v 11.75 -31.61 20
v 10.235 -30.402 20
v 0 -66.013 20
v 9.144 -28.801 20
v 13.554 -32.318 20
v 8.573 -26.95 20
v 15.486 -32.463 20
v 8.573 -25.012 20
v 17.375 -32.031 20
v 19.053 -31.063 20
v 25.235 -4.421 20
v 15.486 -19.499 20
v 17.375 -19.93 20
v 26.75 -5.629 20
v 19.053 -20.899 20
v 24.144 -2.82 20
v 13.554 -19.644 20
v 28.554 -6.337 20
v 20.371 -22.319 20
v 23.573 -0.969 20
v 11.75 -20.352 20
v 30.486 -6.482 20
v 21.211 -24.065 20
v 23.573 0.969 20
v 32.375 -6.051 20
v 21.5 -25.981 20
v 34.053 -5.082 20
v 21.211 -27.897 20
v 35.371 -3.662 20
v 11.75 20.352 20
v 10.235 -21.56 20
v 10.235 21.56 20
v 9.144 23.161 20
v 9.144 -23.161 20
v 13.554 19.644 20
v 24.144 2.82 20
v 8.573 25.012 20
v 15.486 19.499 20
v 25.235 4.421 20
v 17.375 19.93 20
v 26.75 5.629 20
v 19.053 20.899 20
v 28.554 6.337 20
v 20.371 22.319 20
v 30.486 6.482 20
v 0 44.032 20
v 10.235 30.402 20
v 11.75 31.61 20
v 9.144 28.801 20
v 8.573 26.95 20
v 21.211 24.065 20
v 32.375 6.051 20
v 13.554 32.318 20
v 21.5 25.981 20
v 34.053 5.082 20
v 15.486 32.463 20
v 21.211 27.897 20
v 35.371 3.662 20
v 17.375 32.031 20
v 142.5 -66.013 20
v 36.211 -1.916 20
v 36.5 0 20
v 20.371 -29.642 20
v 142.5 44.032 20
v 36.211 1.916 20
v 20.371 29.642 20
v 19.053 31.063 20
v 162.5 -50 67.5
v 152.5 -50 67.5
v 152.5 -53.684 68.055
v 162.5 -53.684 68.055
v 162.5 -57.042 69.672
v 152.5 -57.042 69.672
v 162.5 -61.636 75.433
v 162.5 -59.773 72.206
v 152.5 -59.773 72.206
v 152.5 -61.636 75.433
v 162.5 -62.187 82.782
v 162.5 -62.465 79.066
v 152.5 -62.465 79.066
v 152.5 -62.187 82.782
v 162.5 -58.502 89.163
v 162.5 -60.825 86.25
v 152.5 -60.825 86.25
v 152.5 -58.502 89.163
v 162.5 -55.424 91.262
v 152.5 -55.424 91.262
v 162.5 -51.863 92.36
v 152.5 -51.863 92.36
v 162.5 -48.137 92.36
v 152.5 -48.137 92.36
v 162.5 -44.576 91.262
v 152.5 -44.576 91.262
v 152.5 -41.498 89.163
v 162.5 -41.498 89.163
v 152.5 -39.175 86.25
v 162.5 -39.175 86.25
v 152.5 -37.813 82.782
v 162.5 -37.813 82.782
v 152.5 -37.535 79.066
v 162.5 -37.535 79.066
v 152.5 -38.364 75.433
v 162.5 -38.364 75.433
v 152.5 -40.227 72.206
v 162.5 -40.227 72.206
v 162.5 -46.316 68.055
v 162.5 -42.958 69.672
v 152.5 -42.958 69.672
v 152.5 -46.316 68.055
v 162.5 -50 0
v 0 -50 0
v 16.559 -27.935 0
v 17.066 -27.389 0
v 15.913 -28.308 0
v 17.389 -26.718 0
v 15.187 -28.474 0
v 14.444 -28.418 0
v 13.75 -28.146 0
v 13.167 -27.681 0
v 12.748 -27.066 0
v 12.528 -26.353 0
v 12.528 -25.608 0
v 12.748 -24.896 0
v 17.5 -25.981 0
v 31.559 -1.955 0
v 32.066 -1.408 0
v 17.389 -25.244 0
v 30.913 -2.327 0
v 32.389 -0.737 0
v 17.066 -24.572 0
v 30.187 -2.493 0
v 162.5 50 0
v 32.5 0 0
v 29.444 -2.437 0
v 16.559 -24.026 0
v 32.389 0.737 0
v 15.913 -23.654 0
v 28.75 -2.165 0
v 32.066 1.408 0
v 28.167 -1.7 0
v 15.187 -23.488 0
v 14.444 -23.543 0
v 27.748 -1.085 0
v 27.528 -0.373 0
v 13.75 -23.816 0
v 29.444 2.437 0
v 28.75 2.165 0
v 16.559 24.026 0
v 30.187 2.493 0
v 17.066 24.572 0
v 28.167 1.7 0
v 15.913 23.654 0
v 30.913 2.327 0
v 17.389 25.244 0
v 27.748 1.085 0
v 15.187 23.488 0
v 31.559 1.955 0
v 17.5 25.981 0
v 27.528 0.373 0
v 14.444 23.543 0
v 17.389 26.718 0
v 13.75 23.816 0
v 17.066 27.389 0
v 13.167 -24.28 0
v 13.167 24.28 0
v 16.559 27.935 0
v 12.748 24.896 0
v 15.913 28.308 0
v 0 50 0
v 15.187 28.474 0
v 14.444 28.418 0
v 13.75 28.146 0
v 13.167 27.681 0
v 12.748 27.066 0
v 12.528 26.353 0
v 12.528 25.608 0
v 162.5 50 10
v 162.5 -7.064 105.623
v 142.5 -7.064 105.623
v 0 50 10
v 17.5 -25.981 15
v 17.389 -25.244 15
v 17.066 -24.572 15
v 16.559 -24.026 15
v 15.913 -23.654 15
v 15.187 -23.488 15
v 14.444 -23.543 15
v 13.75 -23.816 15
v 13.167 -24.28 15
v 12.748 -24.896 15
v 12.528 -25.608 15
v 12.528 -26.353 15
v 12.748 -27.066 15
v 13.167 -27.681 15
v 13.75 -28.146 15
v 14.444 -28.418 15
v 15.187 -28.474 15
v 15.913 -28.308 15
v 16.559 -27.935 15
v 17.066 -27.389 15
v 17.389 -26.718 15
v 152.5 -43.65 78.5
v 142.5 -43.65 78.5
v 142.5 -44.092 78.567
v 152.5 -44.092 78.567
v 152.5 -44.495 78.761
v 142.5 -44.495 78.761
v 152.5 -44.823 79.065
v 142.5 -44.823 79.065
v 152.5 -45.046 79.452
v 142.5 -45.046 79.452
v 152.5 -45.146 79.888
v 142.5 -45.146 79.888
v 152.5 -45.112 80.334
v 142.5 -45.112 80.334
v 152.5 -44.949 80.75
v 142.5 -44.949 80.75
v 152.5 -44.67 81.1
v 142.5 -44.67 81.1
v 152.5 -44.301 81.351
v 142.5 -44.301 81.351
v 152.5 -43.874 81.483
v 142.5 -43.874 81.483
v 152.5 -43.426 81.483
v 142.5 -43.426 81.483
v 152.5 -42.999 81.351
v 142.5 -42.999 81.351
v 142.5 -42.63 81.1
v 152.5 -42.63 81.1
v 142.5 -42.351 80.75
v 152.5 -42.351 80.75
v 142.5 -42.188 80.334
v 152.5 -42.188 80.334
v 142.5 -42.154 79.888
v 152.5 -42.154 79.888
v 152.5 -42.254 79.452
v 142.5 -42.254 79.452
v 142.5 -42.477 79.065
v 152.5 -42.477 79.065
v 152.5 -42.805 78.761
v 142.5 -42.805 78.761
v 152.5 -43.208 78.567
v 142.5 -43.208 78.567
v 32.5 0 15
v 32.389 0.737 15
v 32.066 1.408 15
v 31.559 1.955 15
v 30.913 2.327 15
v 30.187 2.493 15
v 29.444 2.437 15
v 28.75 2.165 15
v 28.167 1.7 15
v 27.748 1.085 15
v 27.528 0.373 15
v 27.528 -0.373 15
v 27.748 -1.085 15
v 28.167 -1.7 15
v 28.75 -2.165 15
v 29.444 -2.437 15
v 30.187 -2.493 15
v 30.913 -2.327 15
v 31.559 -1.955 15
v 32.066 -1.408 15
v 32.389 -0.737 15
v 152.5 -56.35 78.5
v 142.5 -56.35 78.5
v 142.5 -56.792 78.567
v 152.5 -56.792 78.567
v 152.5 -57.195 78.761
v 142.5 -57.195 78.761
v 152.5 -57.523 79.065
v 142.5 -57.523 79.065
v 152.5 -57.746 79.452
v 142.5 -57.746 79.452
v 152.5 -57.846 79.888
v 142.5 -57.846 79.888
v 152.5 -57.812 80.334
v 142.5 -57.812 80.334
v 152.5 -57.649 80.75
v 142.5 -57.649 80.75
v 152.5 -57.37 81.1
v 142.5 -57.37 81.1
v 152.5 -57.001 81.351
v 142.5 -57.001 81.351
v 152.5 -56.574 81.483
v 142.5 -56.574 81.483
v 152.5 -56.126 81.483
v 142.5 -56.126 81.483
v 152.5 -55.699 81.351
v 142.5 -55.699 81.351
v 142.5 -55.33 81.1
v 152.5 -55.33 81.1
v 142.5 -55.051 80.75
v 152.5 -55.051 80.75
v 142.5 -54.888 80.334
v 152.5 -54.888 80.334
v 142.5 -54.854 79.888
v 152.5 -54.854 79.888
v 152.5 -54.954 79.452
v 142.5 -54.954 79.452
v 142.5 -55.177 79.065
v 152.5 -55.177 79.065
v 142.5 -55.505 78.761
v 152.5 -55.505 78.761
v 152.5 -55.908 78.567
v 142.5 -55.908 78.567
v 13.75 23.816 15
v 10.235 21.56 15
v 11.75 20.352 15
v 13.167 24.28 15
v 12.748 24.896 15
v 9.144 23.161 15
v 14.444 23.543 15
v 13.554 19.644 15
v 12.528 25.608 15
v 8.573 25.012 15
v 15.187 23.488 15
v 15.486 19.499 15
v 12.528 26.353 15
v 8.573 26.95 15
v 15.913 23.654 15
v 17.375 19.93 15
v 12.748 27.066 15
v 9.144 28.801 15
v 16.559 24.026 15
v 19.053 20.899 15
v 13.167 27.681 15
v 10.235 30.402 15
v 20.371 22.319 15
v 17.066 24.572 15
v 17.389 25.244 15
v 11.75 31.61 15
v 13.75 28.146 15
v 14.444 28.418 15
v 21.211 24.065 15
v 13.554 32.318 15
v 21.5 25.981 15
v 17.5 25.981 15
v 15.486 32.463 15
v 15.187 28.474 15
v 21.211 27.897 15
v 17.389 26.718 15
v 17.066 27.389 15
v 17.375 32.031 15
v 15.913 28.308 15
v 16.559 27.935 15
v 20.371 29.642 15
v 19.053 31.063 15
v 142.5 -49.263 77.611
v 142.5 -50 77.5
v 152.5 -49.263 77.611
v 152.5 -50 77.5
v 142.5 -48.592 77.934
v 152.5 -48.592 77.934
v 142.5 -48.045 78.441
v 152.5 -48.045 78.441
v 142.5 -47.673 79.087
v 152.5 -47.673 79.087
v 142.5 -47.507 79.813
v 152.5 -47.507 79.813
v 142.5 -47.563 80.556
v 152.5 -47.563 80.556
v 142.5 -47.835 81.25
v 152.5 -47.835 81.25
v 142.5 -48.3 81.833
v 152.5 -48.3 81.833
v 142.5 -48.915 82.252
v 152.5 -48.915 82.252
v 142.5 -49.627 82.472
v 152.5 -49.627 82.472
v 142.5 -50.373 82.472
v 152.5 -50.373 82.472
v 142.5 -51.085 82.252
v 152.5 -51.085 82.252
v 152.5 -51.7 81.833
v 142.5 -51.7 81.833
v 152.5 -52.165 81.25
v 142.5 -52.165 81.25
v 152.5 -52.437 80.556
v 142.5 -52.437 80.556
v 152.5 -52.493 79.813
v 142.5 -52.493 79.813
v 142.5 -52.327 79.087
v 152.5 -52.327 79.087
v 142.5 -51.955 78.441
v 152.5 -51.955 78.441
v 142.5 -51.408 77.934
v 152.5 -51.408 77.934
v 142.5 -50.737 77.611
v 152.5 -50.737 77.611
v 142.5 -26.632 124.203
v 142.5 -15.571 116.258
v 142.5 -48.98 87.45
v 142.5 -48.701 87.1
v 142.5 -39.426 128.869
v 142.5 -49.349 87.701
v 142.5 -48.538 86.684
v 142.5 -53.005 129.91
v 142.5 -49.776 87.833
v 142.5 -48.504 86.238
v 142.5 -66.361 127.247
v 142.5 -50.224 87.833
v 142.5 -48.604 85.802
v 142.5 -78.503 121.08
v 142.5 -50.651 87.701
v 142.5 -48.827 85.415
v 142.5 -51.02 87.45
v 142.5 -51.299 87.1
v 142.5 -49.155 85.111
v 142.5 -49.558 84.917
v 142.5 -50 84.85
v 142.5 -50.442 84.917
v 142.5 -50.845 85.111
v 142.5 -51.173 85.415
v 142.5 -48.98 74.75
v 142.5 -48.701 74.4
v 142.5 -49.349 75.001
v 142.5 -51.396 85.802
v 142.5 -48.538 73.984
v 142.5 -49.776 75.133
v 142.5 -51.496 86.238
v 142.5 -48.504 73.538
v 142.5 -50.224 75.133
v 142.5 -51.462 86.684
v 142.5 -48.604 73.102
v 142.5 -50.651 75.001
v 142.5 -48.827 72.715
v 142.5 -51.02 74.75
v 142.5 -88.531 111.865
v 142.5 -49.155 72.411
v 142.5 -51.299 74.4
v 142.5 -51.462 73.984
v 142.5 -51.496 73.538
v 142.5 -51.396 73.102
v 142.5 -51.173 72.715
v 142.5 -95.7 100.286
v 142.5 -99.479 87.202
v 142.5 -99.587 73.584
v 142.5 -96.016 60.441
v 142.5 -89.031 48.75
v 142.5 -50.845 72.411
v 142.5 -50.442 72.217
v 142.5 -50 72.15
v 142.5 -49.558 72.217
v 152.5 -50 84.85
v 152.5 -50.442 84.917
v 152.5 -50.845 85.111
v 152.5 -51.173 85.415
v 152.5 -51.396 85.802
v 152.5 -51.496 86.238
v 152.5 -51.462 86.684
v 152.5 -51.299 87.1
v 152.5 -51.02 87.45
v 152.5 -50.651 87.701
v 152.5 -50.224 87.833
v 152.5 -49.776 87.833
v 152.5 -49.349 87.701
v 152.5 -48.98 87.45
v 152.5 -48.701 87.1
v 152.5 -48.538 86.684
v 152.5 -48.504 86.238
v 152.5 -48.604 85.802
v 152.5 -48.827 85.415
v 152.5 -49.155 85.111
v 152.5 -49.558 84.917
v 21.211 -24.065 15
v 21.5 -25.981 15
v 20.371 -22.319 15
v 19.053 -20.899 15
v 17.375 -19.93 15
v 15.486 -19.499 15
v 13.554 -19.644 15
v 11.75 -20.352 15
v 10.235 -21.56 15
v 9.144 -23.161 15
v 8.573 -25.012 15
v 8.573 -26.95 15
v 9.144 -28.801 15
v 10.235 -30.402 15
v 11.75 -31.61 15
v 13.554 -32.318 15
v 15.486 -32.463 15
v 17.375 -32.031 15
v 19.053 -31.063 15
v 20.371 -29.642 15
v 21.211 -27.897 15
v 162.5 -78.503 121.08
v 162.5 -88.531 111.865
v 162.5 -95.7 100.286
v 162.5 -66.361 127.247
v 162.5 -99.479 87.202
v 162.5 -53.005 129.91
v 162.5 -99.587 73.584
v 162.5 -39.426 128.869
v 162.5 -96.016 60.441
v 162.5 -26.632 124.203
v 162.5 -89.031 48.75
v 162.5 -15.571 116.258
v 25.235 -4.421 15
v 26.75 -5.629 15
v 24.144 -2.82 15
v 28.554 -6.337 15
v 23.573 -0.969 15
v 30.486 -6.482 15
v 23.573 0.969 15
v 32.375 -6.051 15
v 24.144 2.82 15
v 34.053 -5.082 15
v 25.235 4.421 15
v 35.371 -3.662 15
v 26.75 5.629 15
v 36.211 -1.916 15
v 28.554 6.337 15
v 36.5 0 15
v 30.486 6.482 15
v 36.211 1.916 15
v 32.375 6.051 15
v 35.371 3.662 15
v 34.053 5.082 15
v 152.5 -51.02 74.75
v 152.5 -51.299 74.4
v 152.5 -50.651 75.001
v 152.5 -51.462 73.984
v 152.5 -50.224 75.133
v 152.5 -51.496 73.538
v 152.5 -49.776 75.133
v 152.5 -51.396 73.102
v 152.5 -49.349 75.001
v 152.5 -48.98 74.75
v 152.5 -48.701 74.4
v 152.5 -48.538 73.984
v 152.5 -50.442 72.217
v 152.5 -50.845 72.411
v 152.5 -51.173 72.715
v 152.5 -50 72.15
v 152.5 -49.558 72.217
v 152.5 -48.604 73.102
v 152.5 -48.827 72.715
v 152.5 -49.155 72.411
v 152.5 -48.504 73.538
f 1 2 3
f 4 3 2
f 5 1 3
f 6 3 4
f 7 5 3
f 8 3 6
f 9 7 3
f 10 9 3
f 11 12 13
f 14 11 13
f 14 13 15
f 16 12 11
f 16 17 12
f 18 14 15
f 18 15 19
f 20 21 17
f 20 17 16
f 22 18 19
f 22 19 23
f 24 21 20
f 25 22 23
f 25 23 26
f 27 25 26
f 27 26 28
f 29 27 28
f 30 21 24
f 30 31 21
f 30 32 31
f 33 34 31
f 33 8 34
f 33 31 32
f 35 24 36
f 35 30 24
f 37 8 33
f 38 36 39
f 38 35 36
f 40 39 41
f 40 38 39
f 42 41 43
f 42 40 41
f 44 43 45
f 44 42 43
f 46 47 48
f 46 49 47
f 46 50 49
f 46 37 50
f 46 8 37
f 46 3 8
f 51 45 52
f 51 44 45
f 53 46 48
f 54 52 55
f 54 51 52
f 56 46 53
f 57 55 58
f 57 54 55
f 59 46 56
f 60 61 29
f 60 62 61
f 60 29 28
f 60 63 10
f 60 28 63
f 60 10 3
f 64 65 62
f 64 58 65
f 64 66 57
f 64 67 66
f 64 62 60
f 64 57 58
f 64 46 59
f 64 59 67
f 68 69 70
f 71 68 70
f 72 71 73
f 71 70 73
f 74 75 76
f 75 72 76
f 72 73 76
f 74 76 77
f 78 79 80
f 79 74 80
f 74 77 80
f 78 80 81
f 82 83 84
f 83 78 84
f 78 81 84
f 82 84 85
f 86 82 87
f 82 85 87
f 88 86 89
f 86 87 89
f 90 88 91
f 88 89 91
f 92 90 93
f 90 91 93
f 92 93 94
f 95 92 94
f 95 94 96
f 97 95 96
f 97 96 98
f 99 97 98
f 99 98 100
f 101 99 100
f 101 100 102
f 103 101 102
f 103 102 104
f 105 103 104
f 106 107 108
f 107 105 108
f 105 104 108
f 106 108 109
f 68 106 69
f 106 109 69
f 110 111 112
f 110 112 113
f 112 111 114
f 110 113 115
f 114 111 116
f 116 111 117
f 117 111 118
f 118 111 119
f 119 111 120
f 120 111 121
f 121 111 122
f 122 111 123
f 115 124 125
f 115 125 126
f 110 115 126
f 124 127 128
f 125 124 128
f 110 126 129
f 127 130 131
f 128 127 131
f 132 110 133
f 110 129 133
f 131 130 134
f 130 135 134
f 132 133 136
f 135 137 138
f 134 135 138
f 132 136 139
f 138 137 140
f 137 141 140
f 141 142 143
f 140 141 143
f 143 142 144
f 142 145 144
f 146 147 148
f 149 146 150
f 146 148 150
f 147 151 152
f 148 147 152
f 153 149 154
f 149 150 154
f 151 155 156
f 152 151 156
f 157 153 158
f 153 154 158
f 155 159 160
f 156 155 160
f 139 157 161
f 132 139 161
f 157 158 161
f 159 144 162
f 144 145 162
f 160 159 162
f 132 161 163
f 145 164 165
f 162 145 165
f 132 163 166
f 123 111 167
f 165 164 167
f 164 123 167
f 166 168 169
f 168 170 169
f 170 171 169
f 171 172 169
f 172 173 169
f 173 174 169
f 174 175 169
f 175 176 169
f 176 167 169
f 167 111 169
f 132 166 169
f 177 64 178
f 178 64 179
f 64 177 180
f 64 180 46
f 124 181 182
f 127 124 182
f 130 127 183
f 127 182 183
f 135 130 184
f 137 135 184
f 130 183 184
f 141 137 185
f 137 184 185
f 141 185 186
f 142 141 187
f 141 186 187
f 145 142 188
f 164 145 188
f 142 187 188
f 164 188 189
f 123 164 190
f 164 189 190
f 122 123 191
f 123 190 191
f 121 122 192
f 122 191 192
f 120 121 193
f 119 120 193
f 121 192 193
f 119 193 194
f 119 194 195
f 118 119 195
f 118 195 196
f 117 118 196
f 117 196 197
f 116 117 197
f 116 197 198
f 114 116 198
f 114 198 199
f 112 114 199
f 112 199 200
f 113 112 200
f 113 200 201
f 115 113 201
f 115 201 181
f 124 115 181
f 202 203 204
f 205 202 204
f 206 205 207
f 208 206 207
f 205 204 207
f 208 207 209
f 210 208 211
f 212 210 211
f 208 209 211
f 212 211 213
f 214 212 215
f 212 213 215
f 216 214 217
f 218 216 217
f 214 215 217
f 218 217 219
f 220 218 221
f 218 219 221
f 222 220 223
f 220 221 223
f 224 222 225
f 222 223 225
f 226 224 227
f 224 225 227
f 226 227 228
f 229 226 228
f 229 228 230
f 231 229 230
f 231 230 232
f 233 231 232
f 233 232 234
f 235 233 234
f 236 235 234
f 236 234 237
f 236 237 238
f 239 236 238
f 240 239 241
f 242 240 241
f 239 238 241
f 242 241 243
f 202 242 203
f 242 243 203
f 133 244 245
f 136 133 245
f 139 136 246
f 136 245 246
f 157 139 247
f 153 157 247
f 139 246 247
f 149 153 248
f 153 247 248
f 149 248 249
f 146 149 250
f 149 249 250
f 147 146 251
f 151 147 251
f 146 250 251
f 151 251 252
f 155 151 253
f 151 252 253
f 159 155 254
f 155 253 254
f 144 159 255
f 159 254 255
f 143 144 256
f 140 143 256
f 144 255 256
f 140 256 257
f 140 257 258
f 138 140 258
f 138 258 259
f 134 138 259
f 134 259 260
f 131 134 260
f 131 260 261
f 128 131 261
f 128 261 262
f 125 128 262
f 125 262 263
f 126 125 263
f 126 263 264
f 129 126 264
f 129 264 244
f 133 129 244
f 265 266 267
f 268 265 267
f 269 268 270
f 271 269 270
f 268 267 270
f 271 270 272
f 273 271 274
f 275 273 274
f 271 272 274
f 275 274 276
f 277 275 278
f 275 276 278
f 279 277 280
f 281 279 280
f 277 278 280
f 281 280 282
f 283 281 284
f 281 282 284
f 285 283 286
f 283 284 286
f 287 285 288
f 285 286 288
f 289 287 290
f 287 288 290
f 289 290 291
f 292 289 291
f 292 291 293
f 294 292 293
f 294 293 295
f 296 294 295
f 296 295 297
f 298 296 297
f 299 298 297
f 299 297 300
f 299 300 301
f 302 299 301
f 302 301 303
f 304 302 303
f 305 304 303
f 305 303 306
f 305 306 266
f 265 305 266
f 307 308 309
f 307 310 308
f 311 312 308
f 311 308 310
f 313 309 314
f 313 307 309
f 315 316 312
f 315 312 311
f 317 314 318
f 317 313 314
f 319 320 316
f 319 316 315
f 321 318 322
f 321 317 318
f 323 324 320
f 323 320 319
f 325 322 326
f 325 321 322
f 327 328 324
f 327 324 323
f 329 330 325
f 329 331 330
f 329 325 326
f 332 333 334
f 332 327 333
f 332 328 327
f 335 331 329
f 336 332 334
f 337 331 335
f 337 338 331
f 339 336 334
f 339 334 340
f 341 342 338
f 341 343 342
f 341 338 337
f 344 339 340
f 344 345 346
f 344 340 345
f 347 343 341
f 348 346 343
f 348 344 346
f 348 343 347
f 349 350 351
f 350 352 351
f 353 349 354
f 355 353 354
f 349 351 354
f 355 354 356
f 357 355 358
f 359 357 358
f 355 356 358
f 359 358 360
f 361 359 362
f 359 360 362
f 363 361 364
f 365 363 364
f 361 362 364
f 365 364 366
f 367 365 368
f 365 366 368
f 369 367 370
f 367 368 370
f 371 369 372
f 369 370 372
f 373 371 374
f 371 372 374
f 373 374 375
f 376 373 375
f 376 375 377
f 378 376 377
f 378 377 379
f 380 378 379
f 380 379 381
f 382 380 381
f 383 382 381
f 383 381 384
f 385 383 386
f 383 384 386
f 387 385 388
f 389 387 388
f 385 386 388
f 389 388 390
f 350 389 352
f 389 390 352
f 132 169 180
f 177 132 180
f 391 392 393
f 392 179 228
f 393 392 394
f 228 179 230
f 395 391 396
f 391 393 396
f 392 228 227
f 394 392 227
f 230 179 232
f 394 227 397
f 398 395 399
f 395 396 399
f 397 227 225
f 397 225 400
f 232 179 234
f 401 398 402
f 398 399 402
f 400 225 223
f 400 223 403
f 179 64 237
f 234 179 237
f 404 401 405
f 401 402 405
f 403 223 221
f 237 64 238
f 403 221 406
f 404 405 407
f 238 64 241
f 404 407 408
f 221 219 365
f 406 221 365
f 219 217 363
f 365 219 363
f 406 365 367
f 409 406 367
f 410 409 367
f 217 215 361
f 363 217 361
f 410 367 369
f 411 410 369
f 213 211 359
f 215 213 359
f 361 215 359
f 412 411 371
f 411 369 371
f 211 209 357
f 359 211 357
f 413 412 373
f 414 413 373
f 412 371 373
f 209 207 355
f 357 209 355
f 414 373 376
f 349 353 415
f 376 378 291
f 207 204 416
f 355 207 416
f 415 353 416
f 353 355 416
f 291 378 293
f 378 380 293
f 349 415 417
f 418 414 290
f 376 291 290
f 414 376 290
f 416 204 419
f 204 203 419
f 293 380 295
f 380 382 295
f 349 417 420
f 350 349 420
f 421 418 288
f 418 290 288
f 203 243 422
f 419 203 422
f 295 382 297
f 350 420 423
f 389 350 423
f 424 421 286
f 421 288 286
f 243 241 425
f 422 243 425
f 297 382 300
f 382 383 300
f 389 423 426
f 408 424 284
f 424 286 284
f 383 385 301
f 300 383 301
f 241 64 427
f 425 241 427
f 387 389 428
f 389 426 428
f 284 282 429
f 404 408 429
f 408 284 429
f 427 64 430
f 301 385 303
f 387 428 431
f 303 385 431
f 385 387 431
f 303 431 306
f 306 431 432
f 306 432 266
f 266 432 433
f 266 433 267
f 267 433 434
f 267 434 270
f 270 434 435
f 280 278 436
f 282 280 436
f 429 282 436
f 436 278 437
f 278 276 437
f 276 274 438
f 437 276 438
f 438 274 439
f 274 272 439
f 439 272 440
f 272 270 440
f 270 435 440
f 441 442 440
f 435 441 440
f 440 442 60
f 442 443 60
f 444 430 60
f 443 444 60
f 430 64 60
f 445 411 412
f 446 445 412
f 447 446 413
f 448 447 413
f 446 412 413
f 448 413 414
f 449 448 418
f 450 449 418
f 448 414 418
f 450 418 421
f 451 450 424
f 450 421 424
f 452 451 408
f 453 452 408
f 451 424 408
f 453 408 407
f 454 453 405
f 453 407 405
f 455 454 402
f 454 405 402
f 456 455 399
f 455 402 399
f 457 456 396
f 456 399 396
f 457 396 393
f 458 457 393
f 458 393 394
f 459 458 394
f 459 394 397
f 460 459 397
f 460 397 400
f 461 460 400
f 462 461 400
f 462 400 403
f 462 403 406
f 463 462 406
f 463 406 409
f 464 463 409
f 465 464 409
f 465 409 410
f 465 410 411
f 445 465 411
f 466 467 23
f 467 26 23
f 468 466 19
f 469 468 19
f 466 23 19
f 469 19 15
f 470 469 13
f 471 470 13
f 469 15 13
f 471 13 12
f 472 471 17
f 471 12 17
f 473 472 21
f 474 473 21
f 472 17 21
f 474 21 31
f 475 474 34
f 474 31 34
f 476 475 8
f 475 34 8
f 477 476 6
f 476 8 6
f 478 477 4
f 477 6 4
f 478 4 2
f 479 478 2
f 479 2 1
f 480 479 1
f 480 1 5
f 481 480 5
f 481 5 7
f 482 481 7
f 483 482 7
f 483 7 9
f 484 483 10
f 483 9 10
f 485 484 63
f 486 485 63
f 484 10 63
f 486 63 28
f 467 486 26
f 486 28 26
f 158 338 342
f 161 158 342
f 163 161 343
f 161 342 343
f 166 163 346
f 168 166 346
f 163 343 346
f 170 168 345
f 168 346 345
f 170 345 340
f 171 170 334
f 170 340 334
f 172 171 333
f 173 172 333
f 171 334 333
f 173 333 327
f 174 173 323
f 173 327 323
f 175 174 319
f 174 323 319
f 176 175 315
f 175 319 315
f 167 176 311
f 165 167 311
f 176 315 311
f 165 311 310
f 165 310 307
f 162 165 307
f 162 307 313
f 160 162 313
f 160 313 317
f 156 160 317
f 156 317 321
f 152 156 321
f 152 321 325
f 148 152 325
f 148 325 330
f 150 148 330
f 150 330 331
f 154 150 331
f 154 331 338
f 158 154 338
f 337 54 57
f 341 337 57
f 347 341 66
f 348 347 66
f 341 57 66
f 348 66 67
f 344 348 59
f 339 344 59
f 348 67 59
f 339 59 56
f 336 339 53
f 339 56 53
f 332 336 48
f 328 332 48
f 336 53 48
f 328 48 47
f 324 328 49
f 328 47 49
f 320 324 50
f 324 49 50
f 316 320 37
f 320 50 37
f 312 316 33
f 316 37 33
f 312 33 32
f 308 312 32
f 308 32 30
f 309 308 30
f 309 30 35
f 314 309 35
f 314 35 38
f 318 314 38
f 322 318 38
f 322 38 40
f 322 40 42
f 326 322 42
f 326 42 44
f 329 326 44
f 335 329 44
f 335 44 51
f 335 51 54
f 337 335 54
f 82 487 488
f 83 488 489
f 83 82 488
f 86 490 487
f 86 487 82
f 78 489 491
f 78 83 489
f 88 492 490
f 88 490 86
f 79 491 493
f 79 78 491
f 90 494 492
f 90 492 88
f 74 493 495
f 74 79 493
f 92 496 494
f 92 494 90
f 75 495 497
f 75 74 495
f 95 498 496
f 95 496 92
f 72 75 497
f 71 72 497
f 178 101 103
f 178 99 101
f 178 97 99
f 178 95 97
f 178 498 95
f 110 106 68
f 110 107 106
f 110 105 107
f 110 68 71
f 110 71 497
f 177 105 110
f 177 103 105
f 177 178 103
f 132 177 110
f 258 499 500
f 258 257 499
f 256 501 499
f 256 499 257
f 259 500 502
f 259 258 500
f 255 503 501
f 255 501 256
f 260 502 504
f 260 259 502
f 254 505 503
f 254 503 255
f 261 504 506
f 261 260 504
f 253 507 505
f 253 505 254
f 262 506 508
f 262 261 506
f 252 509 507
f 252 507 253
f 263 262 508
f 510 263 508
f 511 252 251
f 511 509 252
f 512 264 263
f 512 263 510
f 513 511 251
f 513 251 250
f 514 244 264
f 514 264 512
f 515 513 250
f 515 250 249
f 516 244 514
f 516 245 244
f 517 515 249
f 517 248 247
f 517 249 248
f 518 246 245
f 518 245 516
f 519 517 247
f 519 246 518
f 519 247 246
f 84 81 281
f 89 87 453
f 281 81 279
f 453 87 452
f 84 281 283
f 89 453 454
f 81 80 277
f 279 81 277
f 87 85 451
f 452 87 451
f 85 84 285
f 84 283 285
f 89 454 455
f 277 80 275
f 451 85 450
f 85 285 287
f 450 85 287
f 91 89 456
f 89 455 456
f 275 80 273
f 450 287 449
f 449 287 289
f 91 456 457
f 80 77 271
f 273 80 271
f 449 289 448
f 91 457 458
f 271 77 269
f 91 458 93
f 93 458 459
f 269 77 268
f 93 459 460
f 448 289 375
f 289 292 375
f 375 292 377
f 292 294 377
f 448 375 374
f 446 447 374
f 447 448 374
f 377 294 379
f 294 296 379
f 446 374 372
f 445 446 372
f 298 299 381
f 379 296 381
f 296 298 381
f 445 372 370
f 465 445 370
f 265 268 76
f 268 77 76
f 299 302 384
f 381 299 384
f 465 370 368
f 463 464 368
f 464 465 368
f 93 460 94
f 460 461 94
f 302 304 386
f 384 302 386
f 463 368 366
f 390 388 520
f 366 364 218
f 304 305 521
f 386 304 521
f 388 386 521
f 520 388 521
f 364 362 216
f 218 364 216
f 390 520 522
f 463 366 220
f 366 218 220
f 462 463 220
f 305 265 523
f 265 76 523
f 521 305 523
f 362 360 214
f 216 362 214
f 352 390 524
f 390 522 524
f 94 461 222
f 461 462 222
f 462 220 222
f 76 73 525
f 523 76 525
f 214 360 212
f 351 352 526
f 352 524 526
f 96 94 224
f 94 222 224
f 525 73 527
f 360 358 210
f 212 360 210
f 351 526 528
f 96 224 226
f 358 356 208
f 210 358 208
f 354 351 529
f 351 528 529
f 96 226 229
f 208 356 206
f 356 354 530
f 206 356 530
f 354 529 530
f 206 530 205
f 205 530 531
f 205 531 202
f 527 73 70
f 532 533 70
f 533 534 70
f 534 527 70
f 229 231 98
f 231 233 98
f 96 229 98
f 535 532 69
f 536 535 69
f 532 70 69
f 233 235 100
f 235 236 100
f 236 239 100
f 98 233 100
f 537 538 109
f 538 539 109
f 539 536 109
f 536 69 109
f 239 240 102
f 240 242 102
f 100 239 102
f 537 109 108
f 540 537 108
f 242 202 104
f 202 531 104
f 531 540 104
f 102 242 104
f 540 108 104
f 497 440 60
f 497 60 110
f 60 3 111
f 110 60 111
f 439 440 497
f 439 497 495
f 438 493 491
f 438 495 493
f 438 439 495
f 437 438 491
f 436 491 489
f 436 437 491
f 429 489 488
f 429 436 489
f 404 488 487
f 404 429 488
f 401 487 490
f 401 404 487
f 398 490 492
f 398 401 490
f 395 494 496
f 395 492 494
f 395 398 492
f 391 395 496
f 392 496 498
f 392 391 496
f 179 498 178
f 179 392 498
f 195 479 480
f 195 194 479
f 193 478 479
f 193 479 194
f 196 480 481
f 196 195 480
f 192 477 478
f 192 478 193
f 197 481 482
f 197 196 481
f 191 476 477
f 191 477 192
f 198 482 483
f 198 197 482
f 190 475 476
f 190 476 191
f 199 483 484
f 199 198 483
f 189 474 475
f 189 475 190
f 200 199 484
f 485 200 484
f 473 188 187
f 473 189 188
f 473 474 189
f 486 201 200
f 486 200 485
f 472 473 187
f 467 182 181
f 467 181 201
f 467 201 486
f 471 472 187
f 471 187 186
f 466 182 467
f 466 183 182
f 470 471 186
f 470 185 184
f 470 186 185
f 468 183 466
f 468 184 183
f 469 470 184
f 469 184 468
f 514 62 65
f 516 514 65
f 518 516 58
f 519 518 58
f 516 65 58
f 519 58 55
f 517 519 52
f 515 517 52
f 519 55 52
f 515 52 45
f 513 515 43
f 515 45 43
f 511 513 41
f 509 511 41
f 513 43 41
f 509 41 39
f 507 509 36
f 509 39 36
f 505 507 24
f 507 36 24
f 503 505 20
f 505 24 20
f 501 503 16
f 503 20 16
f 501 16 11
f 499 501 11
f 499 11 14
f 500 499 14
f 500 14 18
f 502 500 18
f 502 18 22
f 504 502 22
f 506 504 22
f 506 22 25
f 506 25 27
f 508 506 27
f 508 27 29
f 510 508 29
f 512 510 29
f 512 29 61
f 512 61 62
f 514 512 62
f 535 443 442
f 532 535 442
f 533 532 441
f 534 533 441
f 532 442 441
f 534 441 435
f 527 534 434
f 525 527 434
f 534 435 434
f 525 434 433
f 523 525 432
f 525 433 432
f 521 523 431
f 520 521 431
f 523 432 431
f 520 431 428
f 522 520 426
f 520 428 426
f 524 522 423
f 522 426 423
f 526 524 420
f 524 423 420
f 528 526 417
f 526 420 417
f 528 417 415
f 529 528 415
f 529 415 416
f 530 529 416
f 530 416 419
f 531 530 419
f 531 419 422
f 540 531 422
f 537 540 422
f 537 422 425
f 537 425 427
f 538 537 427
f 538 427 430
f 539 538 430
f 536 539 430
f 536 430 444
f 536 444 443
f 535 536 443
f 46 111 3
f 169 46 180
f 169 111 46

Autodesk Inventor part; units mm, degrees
ref_plane "YZ Plane" through (0, 0, 0) normal (1, 0, 0) x (0, 1, 0)
ref_plane "XZ Plane" through (0, 0, 0) normal (0, 1, 0) x (-1, 0, 0)
sketch "Sketch1" plane through (0, 0, 0) normal (0, 0, 1) x (1, 0, 0)
  line L0 (-152.5, -50) -> (152.5, -50)
  line L1 (152.5, -50) -> (152.5, 50)
  line L2 (152.5, 50) -> (-152.5, 50)
  line L3 (-152.5, 50) -> (-152.5, -50)
  line L4 (-152.5, -50) -> (152.5, 50) construction
  line L5 (152.5, -50) -> (-152.5, 50) construction
  point P0 (0, 0)
  dimension "d0" = 305
  dimension "d1" = 100
extrude "Extrusion1" add sketch "Sketch1" along normal blind 10
sketch "Sketch4" plane through (152.5, -50, 0) normal (1, 0, 0) x (0, 0, -1)
  circle A0 centre (-80, 0) radius 50 construction
  line L0 (0, 0) -> (-10, 0)
  line L1 (0, 0) -> (-48.75, -39.0312)
  line L2 (-10, 0) -> (-10, 100)
  line L3 (-10, 100) -> (-105.6226, 42.9358)
  arc A1 (-105.6226, 42.9358) -> (-48.75, -39.0312) centre (-80, 0) ccw
  line L4 (0, 0) -> (-10, 0)
  line L5 (-10, 100) -> (-10, 0)
  dimension "d8" = 100
  dimension "d20" = 80
extrude "Extrusion3" add sketch "Sketch4" against normal blind 305
ref_plane "Work Plane1" through (0, 0, 20) normal (0, 0, 1) x (1, 0, 0)
sketch "Sketch5" plane through (0, 0, 20) normal (0, 0, 1) x (1, 0, 0)
  line L0 (152.5, 50) -> (-152.5, 50) projected
  line L1 (152.5, -100) -> (-152.5, -100) projected
  line L2 (-142.5, 50) -> (142.5, 50)
  line L3 (142.5, 50) -> (142.5, -100)
  line L4 (142.5, -100) -> (-142.5, -100)
  line L5 (-142.5, -100) -> (-142.5, 50)
  line L6 (-152.5, 50) -> (-152.5, -50) projected
  line L7 (152.5, -50) -> (152.5, 50) projected
  point P0 (0, 0)
  dimension "d16" = 10
  dimension "d17" = 10
extrude "Extrusion4" cut sketch "Sketch5" along normal through all
sketch "Sketch9" plane through (152.5, -50, 0) normal (1, 0, 0) x (0, 0, -1)
  arc A0 (-105.6226, 42.9358) -> (-48.75, -39.0312) centre (-80, 0) ccw projected
  circle A1 centre (-80, 0) radius 2.5
  point P0 (0, 50)
  dimension "d28" = 5
extrude "Extrusion8" cut sketch "Sketch9" against normal through all
sketch "Sketch11" plane through (0, 0, 20) normal (0, 0, 1) x (1, 0, 0)
  circle A0 centre (30, 0) radius 2.5
  circle A1 centre (15, 25.9808) radius 2.5
  circle A2 centre (-15, 25.9808) radius 2.5
  circle A3 centre (-30, 0) radius 2.5
  circle A4 centre (-15, -25.9808) radius 2.5
  circle A5 centre (15, -25.9808) radius 2.5
  circle A6 centre (0, 0) radius 15
  dimension "d33" = 5
  dimension "d34" = 30
  dimension "d37" = 360
  dimension "d41" = 30
extrude "Extrusion10" cut sketch "Sketch11" against normal through all contours A0 | A1 | A2 | A3 | A4 | A5
sketch "Sketch14" plane through (-142.5, -66.0128, 20) normal (1, 0, 0) x (0, 0, -1)
  circle A0 centre (-60, 16.0128) radius 2.5 projected
  circle A1 centre (-60, 22.3628) radius 1.5
  circle A2 centre (-66.35, 16.0128) radius 1.5
  circle A3 centre (-60, 9.6628) radius 1.5
  circle A4 centre (-53.65, 16.0128) radius 1.5
  point P0 (20, 66.0128)
  dimension "d49" = 3
  dimension "d50" = 6.35
  dimension "d53" = 360
extrude "Extrusion12" cut sketch "Sketch14" along normal through all both and the other way through all contours A1 | A2 | A3 | A4
sketch "Sketch15" plane through (0, 0, 20) normal (0, 0, 1) x (1, 0, 0)
  line L0 (152.5, 50) -> (-152.5, 50) projected
  line L1 (-152.5, -7.0642) -> (-152.5, -100) projected
  line L2 (0, 50) -> (-152.5, 50)
  line L3 (-152.5, 50) -> (-152.5, -100)
  line L4 (-152.5, -100) -> (0, -100)
  line L5 (0, -100) -> (0, 50)
  point P0 (0, 0)
  point P1 (-152.5, -89.0312)
extrude "Extrusion13" cut sketch "Sketch15" along normal through all both and the other way through all
sketch "Sketch16" plane through (152.5, -50, 0) normal (1, 0, 0) x (0, 0, -1)
  circle A0 centre (-80, 0) radius 2.5 projected
  circle A1 centre (-80, 0) radius 12.5
  circle A2 centre (-80, -6.35) radius 1.5 construction
  circle A3 centre (-80, 6.35) radius 1.5 construction
  circle A4 centre (-86.35, 0) radius 1.5 construction
  circle A5 centre (-73.65, 0) radius 1.5 construction
  circle A6 centre (-80, 0) radius 2.5 projected
  line L0 (0, 0) -> (0, 100) projected
  line L1 (0, 100) -> (-10, 100) projected
  line L2 (-10, 100) -> (-105.6226, 42.9358) projected
  arc A7 (-105.6226, 42.9358) -> (-48.75, -39.0312) centre (-80, 0) ccw projected
  line L3 (-48.75, -39.0312) -> (0, 0) projected
  point P0 (0, 50)
  dimension "d59" = 25
extrude "Extrusion14" add sketch "Sketch16" along normal blind 10 contours L3 A7 L2 L1 L0
sketch "Sketch17" plane through (0, 0, 20) normal (0, 0, 1) x (1, 0, 0)
  circle A0 centre (30, 0) radius 2.5 projected
  circle A1 centre (30, 0) radius 6.5
  circle A2 centre (15, 25.9808) radius 6.5
  circle A3 centre (-15, 25.9808) radius 6.5
  circle A4 centre (-30, 0) radius 6.5
  circle A5 centre (-15, -25.9808) radius 6.5
  circle A6 centre (15, -25.9808) radius 6.5
  point P0 (0, 0)
  dimension "d62" = 13
  dimension "d65" = 360
extrude "Extrusion15" cut sketch "Sketch17" against normal blind 5 contours A0 | A1 | A2 | A3 | A4 | A5 | A6
properties part number "HA004"
